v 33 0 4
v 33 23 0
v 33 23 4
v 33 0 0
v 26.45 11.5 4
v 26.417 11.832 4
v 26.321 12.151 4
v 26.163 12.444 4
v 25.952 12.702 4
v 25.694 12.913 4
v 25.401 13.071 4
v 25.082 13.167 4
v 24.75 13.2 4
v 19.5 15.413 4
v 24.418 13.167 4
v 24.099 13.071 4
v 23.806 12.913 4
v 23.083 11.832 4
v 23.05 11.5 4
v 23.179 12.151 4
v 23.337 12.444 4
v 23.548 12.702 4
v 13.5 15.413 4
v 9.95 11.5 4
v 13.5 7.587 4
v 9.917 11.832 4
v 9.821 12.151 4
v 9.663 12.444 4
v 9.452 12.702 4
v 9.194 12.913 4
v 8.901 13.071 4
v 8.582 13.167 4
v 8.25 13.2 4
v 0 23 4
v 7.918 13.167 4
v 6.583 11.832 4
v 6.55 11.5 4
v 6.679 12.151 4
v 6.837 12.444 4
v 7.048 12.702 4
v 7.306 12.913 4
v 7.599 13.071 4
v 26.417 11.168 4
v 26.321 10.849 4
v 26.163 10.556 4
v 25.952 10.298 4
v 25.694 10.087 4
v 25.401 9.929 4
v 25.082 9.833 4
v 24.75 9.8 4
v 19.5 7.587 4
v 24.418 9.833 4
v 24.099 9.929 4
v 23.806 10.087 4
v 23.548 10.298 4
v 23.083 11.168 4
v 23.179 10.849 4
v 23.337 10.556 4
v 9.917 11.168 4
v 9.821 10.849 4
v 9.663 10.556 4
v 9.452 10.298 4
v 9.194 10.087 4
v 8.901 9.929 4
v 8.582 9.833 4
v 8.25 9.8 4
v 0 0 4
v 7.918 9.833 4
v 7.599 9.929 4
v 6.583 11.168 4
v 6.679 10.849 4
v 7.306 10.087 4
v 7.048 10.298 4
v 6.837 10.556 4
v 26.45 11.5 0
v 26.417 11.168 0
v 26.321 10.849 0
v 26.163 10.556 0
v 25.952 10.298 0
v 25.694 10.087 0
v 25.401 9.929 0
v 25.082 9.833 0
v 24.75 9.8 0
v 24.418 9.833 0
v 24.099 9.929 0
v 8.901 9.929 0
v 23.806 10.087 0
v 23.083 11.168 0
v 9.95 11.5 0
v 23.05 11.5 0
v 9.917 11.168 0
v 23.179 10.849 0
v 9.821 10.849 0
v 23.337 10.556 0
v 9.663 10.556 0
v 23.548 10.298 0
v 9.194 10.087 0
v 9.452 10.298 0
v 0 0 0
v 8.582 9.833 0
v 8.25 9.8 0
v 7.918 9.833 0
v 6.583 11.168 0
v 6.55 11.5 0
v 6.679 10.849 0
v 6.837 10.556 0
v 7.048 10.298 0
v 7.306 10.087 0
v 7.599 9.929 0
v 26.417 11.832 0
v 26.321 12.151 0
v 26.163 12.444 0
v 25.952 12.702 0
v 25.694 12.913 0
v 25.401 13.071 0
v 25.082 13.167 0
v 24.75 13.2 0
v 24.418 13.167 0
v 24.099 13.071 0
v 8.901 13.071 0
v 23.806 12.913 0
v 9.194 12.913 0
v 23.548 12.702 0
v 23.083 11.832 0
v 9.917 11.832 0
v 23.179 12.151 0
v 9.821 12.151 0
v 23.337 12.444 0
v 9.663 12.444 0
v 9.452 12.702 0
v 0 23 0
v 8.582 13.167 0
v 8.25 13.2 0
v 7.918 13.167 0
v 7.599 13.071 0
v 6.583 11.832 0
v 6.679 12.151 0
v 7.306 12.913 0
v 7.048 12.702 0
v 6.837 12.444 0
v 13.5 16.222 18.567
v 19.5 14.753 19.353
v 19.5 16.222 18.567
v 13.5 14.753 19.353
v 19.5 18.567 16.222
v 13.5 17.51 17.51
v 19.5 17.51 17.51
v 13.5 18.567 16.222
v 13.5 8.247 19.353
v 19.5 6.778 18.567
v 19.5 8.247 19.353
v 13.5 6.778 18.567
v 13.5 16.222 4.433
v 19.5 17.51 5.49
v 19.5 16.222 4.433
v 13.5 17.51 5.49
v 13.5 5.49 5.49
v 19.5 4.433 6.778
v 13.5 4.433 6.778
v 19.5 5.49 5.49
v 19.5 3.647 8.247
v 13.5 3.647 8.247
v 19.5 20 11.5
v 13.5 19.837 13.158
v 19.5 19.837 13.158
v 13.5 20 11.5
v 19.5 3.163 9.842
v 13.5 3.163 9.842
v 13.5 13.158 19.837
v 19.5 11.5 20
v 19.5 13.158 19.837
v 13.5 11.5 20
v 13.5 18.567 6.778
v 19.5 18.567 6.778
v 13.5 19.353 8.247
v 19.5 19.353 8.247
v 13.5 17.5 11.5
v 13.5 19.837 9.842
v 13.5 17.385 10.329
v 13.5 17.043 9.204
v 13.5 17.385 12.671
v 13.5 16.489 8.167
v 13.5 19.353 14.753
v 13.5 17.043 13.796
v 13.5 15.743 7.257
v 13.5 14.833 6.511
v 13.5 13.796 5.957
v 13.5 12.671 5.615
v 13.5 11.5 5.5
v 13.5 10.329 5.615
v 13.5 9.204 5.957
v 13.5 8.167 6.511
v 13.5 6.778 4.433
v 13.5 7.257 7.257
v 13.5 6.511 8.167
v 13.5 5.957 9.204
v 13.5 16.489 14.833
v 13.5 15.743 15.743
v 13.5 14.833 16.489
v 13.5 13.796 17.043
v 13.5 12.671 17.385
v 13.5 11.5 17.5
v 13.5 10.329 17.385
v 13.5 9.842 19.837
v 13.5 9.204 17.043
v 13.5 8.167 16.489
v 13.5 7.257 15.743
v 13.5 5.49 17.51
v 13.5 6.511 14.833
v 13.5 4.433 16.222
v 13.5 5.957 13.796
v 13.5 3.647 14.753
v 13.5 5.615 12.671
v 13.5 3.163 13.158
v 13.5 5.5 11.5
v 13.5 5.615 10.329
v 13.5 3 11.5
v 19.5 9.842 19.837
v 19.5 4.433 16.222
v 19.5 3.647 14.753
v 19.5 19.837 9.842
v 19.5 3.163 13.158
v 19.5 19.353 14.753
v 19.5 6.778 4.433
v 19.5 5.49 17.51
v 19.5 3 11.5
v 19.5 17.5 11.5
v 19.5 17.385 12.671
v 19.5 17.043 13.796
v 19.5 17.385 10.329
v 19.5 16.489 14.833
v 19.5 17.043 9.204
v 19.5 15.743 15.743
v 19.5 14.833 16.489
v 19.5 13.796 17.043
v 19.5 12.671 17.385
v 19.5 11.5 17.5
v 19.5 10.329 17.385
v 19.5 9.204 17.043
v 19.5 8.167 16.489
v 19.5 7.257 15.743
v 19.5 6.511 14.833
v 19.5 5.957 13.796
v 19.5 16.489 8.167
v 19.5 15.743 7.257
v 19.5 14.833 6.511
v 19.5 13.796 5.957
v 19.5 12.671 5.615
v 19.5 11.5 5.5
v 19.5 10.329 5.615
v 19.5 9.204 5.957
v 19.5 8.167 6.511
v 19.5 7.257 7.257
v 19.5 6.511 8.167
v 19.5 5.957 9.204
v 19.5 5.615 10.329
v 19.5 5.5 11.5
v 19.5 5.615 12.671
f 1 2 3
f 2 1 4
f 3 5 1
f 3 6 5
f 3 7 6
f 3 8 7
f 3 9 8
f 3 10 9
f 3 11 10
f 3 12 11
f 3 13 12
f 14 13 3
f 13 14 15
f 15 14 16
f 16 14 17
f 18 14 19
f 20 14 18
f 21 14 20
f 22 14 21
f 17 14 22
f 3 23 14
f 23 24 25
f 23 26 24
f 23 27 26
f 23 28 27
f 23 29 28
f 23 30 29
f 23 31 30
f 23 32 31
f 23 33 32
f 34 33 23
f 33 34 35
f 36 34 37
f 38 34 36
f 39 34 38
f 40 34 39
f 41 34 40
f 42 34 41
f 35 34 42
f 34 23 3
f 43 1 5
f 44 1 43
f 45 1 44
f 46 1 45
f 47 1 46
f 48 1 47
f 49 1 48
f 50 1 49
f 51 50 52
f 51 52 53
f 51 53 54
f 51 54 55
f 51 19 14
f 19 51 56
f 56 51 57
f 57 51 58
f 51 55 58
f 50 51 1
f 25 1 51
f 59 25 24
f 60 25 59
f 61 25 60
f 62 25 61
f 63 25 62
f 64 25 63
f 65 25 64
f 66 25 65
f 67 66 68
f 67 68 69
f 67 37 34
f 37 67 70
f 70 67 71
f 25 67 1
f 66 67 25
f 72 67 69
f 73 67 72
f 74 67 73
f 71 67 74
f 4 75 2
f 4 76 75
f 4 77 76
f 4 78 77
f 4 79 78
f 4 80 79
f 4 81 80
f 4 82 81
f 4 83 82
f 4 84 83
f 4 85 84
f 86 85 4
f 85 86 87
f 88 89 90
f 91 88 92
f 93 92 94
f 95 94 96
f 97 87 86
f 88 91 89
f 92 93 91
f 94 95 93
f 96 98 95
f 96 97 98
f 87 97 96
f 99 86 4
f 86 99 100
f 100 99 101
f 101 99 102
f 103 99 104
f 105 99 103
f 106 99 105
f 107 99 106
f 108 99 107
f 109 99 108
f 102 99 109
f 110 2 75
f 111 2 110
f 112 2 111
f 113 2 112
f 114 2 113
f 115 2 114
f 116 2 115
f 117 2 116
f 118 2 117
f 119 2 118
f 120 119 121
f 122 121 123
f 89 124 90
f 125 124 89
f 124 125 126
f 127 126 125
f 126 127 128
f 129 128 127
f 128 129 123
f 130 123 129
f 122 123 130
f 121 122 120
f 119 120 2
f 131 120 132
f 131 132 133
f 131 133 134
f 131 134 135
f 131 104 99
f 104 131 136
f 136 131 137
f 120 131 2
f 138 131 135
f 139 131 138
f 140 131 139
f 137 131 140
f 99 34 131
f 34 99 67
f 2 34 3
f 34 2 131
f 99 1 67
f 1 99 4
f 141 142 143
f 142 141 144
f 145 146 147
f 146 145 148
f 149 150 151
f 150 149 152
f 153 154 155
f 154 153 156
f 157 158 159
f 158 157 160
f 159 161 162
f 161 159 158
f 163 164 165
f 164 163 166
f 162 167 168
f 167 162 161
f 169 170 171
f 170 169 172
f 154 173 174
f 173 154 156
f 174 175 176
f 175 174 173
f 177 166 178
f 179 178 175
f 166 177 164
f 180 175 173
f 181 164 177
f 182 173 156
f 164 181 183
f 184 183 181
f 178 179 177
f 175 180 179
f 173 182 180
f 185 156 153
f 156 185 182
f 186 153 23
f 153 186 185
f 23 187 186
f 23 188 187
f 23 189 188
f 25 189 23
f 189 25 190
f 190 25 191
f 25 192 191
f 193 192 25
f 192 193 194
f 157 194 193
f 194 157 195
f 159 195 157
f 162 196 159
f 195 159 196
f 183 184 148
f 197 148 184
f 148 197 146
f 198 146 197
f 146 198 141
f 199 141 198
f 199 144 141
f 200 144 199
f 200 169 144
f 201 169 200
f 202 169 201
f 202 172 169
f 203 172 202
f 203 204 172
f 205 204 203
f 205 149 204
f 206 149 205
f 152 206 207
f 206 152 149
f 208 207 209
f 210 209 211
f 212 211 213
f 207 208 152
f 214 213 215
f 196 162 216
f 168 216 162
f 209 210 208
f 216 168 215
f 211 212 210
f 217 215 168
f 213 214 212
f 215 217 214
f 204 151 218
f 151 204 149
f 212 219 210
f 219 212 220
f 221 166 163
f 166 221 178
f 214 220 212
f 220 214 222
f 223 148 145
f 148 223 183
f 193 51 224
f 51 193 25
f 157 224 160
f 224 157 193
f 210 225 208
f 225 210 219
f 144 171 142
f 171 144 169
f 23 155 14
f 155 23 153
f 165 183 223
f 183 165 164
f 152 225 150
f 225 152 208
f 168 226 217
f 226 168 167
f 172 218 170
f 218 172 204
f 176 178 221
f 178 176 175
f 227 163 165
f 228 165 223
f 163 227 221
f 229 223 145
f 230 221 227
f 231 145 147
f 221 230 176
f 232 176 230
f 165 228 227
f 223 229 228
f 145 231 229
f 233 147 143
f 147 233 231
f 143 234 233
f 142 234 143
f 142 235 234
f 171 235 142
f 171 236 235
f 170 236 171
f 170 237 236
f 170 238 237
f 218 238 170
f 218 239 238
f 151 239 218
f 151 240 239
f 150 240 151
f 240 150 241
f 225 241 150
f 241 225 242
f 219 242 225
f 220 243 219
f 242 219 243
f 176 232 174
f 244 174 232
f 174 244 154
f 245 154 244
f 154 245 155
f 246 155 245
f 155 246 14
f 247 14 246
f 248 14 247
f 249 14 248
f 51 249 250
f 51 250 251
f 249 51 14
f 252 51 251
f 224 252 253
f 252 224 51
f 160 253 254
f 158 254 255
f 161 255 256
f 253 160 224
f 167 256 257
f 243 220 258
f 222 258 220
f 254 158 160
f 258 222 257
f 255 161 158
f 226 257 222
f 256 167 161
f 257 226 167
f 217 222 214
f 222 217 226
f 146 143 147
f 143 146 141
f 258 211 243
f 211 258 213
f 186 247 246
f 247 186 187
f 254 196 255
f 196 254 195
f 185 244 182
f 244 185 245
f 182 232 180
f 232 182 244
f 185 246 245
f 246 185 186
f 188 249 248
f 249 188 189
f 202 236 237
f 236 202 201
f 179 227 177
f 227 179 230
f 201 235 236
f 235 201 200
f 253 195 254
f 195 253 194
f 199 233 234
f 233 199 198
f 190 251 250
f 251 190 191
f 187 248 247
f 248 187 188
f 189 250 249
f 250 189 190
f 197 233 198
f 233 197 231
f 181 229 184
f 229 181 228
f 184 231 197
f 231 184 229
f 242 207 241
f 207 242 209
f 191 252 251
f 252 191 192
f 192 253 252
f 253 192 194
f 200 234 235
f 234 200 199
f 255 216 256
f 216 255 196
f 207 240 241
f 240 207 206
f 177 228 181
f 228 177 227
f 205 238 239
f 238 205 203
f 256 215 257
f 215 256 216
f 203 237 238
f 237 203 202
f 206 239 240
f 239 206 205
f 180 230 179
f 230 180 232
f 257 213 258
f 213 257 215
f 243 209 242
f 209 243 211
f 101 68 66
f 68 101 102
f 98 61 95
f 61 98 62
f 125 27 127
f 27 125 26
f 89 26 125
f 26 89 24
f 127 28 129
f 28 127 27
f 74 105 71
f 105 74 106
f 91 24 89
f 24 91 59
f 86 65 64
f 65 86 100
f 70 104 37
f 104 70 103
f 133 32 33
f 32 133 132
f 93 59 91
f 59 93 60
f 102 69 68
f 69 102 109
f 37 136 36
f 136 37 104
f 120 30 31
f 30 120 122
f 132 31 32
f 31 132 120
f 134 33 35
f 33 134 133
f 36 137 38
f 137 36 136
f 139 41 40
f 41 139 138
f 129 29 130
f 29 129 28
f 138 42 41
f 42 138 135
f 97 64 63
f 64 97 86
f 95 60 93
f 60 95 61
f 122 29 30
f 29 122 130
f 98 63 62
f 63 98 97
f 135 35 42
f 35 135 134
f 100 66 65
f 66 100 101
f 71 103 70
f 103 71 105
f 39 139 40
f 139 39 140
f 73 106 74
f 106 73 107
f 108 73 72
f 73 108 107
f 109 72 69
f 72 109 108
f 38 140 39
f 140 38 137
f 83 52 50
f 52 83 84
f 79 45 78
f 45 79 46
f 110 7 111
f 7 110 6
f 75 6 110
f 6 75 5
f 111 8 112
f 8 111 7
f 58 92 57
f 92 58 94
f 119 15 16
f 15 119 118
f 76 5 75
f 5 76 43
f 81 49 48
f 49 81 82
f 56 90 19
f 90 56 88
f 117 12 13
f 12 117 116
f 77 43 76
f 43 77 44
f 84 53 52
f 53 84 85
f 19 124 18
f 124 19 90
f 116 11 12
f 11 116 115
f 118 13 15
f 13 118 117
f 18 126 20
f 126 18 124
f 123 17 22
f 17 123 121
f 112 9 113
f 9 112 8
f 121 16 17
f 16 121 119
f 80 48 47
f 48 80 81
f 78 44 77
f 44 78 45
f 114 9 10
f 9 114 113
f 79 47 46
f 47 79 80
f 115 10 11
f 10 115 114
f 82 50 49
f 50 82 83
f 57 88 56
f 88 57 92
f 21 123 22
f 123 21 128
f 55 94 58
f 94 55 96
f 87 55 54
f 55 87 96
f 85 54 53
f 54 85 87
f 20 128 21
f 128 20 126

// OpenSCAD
$fn = 32;

// ----------------------------------------------------------------------
// Cable clip: cable 12 mm, clamp 17 mm, base 33 mm
// ----------------------------------------------------------------------

// --- parameters (mm) ---
foot_w = 33;              // base length, X
foot_d = 23;              // base width, Y
foot_t = 4;               // base thickness
hose_seat_d = 17;         // clamp outside diameter
ring_t = 2.5;             // clamp wall
cable_d = 12;             // cable opening
ring_w = 6;               // clamp width along the cable
screw_d = 3.4;            // screw clearance
sink = 1;                 // overlap of the clamp into the base

module base() {
  cube([foot_w, foot_d, foot_t]);
}

module clamp() {
  translate([foot_w / 2, foot_d / 2, foot_t + hose_seat_d / 2 - sink]) rotate([0, 90, 0])
    cylinder(h = ring_w, d = hose_seat_d, center = true);
}

difference() {
  union() {
    base();
    clamp();
  }
  translate([foot_w / 2, foot_d / 2, foot_t + hose_seat_d / 2 - sink]) rotate([0, 90, 0]) translate([0, 0, -ring_w / 2 - 1]) cylinder(h = ring_w + 2, d = cable_d);
  translate([8.25, foot_d / 2, -1]) cylinder(h = foot_t + 2, d = screw_d);
  translate([24.75, foot_d / 2, -1]) cylinder(h = foot_t + 2, d = screw_d);
}
